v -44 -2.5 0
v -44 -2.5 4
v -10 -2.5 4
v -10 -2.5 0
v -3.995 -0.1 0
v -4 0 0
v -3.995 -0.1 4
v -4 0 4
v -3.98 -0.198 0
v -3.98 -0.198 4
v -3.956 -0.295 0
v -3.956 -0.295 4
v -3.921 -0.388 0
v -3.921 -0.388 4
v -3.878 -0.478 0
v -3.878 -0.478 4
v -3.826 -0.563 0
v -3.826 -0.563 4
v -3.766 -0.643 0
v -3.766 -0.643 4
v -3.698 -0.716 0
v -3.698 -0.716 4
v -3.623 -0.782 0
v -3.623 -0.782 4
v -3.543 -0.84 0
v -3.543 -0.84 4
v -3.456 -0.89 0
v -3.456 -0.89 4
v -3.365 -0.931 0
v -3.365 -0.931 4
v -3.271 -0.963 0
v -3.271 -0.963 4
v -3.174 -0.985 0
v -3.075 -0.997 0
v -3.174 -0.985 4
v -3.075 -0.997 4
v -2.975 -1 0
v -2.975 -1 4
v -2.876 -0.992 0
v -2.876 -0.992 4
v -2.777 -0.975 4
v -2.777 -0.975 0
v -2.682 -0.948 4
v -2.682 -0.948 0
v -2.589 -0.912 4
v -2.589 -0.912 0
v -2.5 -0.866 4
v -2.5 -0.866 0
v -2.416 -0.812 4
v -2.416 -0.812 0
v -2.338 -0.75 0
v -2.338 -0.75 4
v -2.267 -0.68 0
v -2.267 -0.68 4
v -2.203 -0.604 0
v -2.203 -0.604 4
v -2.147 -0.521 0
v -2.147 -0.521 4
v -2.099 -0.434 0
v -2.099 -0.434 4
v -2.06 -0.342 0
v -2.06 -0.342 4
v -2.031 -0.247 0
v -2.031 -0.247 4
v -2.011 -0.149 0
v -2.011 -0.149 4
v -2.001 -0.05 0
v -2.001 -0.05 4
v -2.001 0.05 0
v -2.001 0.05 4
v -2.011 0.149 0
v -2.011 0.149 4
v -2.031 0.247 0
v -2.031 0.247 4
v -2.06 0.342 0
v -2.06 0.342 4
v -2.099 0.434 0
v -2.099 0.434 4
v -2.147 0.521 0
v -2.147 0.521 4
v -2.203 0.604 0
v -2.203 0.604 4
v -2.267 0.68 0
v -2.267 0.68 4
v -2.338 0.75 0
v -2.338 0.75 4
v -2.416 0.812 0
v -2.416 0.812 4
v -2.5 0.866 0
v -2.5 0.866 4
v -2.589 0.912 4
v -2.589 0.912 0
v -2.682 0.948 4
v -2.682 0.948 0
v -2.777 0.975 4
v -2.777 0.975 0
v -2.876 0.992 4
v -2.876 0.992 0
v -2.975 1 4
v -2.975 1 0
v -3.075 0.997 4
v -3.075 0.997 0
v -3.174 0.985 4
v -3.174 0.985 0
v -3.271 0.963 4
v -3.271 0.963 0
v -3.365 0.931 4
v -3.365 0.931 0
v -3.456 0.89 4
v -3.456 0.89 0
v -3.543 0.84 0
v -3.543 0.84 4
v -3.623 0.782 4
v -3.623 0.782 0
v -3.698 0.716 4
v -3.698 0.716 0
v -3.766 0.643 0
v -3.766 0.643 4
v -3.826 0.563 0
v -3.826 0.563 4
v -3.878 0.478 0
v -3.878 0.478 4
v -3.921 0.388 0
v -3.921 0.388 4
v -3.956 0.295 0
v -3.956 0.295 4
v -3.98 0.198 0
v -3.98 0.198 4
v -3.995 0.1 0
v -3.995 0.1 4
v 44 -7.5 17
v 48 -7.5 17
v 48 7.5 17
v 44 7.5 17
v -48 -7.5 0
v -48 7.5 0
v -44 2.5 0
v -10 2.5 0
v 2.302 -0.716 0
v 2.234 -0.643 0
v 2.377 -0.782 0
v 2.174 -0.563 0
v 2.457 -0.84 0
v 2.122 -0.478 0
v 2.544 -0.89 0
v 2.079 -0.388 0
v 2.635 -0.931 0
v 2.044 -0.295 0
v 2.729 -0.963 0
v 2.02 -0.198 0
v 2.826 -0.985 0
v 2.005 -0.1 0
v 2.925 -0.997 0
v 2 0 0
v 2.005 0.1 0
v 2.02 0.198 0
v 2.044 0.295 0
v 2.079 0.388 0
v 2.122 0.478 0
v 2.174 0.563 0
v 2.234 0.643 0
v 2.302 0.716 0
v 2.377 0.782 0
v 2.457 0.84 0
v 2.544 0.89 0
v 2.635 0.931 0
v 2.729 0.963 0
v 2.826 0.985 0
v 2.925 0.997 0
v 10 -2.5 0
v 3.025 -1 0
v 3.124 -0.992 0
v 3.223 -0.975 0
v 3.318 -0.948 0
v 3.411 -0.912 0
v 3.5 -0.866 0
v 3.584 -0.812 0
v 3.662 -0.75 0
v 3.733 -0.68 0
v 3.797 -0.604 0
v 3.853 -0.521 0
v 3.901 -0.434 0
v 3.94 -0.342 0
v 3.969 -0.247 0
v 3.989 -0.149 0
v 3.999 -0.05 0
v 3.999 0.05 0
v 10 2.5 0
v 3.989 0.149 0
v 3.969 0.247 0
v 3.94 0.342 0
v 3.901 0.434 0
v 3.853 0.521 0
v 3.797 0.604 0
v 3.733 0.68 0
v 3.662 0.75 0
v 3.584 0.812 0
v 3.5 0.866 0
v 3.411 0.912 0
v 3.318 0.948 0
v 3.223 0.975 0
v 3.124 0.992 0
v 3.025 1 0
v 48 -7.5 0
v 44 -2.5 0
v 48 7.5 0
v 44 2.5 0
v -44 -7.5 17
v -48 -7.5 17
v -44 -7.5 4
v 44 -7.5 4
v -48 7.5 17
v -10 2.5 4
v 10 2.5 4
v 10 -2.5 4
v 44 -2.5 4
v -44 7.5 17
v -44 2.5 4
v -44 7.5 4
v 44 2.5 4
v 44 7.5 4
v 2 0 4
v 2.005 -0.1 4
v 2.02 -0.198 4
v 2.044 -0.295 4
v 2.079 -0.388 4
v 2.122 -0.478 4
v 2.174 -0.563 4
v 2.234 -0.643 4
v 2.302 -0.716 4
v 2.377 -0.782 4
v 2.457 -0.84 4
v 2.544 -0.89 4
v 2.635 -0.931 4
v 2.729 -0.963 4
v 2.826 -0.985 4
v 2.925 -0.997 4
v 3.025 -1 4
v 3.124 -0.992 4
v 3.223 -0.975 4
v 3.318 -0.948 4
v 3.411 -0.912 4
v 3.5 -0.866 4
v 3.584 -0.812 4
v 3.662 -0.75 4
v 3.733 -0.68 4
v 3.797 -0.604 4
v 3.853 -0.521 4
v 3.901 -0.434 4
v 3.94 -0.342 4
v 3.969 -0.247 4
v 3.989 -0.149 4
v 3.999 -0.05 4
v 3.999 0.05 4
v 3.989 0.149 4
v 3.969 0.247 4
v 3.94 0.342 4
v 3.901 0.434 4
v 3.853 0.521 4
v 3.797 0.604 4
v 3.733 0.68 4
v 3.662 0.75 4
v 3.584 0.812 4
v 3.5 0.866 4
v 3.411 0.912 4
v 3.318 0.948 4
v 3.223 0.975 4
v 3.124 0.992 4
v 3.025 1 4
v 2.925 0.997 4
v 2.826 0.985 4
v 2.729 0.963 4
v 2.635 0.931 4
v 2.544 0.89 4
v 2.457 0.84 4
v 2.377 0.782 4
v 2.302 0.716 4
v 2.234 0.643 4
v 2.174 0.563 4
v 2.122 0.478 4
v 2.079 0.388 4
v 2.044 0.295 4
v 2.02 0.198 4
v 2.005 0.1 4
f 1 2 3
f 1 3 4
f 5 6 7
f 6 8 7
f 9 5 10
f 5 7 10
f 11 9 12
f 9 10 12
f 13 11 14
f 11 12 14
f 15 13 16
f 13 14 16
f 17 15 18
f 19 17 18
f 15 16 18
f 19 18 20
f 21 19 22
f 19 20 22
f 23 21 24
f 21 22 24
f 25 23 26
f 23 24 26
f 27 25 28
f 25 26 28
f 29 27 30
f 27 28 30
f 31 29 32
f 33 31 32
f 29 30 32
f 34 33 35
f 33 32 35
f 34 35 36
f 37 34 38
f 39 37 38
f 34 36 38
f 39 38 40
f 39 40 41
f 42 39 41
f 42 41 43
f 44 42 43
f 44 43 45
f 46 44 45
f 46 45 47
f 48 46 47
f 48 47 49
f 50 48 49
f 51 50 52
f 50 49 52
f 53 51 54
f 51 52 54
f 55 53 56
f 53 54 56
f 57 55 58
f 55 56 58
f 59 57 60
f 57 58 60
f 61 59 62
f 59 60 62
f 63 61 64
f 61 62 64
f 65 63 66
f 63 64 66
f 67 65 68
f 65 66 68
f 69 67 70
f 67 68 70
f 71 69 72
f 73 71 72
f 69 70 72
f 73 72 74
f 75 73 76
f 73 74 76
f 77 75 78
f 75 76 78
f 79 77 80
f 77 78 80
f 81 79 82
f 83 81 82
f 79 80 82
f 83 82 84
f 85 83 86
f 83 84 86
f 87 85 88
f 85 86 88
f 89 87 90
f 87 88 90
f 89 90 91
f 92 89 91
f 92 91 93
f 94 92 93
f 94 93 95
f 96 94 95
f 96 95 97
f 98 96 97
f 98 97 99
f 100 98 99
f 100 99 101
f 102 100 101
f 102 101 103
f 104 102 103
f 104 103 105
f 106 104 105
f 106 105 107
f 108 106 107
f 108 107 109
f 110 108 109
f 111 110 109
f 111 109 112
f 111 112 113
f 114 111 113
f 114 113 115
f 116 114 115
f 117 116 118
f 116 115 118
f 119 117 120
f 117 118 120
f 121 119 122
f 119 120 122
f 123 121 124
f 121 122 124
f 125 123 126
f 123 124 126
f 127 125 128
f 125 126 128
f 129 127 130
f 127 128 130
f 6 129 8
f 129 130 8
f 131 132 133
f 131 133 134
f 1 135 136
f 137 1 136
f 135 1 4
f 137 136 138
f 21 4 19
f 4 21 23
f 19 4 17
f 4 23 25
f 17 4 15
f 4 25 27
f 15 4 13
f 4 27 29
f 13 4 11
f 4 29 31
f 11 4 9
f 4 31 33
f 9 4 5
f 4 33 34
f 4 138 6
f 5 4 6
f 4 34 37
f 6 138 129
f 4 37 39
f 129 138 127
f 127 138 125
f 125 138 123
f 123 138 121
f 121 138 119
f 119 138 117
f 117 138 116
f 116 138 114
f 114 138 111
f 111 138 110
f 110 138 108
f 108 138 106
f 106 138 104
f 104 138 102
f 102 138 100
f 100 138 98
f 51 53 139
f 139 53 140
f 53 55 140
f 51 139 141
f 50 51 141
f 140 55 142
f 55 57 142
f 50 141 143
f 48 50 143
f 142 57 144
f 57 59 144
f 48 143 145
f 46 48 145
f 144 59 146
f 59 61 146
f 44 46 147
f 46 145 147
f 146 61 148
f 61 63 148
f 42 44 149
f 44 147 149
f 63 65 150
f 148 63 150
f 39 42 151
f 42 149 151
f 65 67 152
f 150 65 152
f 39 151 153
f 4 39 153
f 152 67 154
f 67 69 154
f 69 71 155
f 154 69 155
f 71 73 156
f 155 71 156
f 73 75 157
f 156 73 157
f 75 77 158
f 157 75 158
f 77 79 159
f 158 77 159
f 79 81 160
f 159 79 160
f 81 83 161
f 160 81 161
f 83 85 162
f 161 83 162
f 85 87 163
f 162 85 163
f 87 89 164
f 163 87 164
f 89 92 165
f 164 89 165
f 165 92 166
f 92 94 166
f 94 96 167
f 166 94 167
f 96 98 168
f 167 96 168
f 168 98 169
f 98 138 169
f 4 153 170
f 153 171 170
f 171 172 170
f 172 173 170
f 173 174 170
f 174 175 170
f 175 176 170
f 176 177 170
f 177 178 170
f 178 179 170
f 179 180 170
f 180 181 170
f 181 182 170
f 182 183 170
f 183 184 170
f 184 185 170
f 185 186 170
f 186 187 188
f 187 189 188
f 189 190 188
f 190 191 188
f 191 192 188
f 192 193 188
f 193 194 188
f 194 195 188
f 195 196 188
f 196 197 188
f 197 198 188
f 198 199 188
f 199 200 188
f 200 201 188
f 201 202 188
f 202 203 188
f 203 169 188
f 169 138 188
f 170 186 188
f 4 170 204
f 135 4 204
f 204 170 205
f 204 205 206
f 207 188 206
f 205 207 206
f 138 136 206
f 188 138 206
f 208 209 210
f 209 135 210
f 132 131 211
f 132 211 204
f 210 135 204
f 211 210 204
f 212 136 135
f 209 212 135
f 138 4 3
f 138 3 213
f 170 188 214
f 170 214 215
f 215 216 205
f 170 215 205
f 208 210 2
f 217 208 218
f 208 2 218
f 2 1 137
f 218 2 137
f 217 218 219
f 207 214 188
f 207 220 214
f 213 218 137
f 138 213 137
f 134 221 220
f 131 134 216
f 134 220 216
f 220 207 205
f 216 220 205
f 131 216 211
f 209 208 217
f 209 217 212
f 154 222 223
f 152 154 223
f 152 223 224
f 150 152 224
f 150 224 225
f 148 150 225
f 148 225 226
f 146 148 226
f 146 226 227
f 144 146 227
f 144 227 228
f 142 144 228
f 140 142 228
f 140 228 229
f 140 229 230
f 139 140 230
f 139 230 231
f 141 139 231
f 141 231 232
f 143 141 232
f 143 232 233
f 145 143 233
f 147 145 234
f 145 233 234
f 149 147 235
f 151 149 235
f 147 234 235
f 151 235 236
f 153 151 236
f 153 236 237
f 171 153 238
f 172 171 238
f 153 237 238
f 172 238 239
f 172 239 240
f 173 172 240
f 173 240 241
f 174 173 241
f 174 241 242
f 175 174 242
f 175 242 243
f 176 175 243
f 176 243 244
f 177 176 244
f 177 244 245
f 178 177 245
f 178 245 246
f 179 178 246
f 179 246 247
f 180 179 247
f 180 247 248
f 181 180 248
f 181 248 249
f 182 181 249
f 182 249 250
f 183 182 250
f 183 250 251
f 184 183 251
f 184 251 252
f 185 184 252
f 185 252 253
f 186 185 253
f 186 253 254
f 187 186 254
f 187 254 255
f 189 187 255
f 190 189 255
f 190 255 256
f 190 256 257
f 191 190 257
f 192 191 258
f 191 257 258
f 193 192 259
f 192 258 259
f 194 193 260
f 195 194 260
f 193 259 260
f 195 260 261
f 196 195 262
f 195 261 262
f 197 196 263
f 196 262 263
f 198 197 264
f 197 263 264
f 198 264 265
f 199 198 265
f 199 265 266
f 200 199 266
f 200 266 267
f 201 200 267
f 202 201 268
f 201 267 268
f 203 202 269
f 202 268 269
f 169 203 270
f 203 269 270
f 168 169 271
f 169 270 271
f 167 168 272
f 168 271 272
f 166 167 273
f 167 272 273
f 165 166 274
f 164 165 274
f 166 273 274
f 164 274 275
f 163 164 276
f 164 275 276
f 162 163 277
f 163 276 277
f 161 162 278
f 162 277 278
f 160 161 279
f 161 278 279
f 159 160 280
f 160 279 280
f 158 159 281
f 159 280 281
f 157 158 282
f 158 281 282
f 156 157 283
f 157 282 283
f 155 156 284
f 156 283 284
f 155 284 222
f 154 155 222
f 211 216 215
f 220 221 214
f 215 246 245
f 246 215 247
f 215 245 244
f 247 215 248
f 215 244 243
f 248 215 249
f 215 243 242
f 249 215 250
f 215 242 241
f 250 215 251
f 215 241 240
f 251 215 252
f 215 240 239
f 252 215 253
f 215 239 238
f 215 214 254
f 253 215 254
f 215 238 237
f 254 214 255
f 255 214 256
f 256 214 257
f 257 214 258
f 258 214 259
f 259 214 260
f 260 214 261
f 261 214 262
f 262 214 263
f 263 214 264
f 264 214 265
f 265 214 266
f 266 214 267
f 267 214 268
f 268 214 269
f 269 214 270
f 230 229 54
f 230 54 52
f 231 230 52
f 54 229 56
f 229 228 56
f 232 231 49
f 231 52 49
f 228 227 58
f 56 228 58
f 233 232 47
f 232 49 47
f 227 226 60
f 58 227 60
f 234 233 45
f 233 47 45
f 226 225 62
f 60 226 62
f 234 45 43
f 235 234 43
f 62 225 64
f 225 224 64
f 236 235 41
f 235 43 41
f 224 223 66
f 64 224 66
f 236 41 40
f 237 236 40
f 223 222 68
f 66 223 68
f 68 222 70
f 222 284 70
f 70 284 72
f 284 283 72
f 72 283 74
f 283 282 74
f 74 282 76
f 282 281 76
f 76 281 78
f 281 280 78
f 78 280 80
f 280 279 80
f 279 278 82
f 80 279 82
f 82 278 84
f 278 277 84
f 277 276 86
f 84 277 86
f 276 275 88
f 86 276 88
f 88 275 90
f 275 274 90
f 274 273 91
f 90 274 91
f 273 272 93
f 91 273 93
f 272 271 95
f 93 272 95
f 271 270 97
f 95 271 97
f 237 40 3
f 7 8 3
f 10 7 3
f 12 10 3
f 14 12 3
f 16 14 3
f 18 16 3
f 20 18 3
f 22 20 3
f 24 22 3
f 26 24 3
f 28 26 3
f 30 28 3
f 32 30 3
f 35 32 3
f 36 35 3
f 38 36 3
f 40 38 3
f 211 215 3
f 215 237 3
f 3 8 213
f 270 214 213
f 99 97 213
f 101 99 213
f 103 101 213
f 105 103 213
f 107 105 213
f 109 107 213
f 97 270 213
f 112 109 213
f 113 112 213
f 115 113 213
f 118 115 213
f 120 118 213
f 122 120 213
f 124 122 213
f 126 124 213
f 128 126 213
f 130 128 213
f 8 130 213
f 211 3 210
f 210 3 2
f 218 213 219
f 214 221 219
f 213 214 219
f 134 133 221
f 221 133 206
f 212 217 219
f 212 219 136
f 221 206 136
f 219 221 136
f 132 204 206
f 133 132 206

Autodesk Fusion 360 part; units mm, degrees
sketch "Sketch1" plane through (0, 0, 0) normal (0, 0, 1) x (1, 0, 0)
  line L0 (10, -7.5) -> (-10, -7.5)
  line L1 (-10, -7.5) -> (-10, 7.5)
  line L2 (-10, 7.5) -> (10, 7.5)
  line L3 (10, 7.5) -> (10, -7.5)
  line L4 (10, -7.5) -> (-10, 7.5) construction
  line L5 (-10, -7.5) -> (10, 7.5) construction
  line L6 (0, 0) -> (0, 7) construction
  dimension "d1" = 20
  dimension "d2" = 15
extrude "Extrude1" add sketch "Sketch1" along normal blind 4
sketch "Sketch2" plane through (0, 0, 4) normal (0, 0, 1) x (-1, 0, 0)
  line L0 (-10, -7.5) -> (10, -7.5)
  line L1 (10, -7.5) -> (10, 7.5)
  line L2 (10, 7.5) -> (-10, 7.5)
  line L3 (-10, 7.5) -> (-10, -7.5)
  line L4 (10, 7.5) -> (-10, -7.5) construction
  line L5 (-10, 7.5) -> (10, -7.5) construction
  line L6 (0, 0) -> (-3, 0) construction
  circle A0 centre (-3, 0) radius 1
  line L7 (0, 0) -> (3, 0) construction
  circle A1 centre (3, 0) radius 1
  dimension "d5" = 3
  dimension "d6" = 2
  dimension "d7" = 3
  dimension "d8" = 2
extrude "Extrude2" cut sketch "Sketch2" against normal up to surface (4 mm away) contours A0 | A1
ref_plane "WorkPlane1" through (48, 0, 2) normal (1, 0, 0) x (0, 1, 0)
sketch "Sketch3" plane through (48, 0, 2) normal (1, 0, 0) x (0, 1, 0)
  line L0 (-7.5, 2) -> (-2.5, 2)
  line L1 (-2.5, 2) -> (-2.5, -2)
  line L2 (-2.5, -2) -> (-7.5, -2)
  line L3 (-7.5, -2) -> (-7.5, 2)
  line L4 (7.5, 2) -> (2.5, 2)
  line L5 (2.5, 2) -> (2.5, -2)
  line L6 (2.5, -2) -> (7.5, -2)
  line L7 (7.5, -2) -> (7.5, 2)
extrude "Extrude3" add sketch "Sketch3" against normal up to surface (38 mm away)
sketch "Sketch4" plane through (0, -2.5, 0) normal (0, 1, 0) x (-1, 0, 0)
  line L0 (-10, 0) -> (-10, 4)
  line L1 (-10, 4) -> (-48, 4)
  line L2 (-48, 4) -> (-48, 0)
  line L3 (-48, 0) -> (-10, 0)
  line L4 (-48, 4) -> (-44, 4)
  line L5 (-44, 4) -> (-44, 0)
  line L6 (-44, 0) -> (-48, 0)
  line L7 (-48, 0) -> (-48, 4)
extrude "Extrude4" add sketch "Sketch4" along normal up to surface (5 mm away) contours L1 L2 L3 L4 L5 L6 L7
sketch "Sketch5" plane through (0, 0, 4) normal (0, 0, 1) x (-1, 0, 0)
  line L0 (-44, 2.5) -> (-10, 2.5)
  line L1 (-10, 2.5) -> (-10, -2.5)
  line L2 (-10, -2.5) -> (-44, -2.5)
  line L3 (-44, -2.5) -> (-44, 2.5)
  circle A0 centre (3, 0) radius 1
  circle A1 centre (-3, 0) radius 1
  line L4 (-48, 7.5) -> (-48, -7.5)
  line L5 (-48, -7.5) -> (10, -7.5)
  line L6 (10, -7.5) -> (10, 7.5)
  line L7 (10, 7.5) -> (-48, 7.5)
  line L8 (-44, -2.5) -> (-44, -7.5)
  line L9 (-44, 2.5) -> (-44, 7.5)
extrude "Extrude5" add sketch "Sketch5" along normal blind 13 contours L3 L4 L5 L7 L8 L9
ref_plane "WorkPlane2" through (-48, 0, 2) normal (-1, 0, 0) x (0, -1, 0)
sketch "Sketch6" plane through (-48, 0, 2) normal (-1, 0, 0) x (0, 1, 0)
  line L0 (7.5, -2) -> (2.5, -2)
  line L1 (2.5, -2) -> (2.5, 2)
  line L2 (2.5, 2) -> (7.5, 2)
  line L3 (7.5, 2) -> (7.5, -2)
  line L4 (-7.5, -2) -> (-2.5, -2)
  line L5 (-2.5, -2) -> (-2.5, 2)
  line L6 (-2.5, 2) -> (-7.5, 2)
  line L7 (-7.5, 2) -> (-7.5, -2)
extrude "Extrude6" add sketch "Sketch6" against normal up to surface (38 mm away)
sketch "Sketch7" plane through (0, 2.5, 0) normal (0, -1, 0) x (1, 0, 0)
  line L0 (-10, 0) -> (-10, 4)
  line L1 (-10, 4) -> (-48, 4)
  line L2 (-48, 4) -> (-48, 0)
  line L3 (-48, 0) -> (-10, 0)
  line L4 (-48, 4) -> (-44, 4)
  line L5 (-44, 4) -> (-44, 0)
  line L6 (-44, 0) -> (-48, 0)
  line L7 (-48, 0) -> (-48, 4)
extrude "Extrude7" add sketch "Sketch7" along normal up to surface (5 mm away) contours L1 L2 L3 L4 L5 L6 L7
sketch "Sketch8" plane through (0, 0, 4) normal (0, 0, 1) x (-1, 0, 0)
  line L0 (44, -2.5) -> (10, -2.5)
  line L1 (10, -2.5) -> (10, 2.5)
  line L2 (10, 2.5) -> (44, 2.5)
  line L3 (44, 2.5) -> (44, -2.5)
  circle A0 centre (-3, 0) radius 1
  circle A1 centre (3, 0) radius 1
  line L4 (48, -7.5) -> (48, 7.5)
  line L5 (48, 7.5) -> (-44, 7.5)
  line L6 (-44, 7.5) -> (-44, 2.5)
  line L7 (-44, 2.5) -> (-10, 2.5)
  line L8 (-10, 2.5) -> (-10, -2.5)
  line L9 (-10, -2.5) -> (-44, -2.5)
  line L10 (-44, -2.5) -> (-44, -7.5)
  line L11 (-44, -7.5) -> (48, -7.5)
  line L12 (44, 2.5) -> (44, 7.5)
  line L13 (44, -2.5) -> (44, -7.5)
extrude "Extrude8" add sketch "Sketch8" along normal blind 13 contours L3 L4 L5 L11 L12 L13
